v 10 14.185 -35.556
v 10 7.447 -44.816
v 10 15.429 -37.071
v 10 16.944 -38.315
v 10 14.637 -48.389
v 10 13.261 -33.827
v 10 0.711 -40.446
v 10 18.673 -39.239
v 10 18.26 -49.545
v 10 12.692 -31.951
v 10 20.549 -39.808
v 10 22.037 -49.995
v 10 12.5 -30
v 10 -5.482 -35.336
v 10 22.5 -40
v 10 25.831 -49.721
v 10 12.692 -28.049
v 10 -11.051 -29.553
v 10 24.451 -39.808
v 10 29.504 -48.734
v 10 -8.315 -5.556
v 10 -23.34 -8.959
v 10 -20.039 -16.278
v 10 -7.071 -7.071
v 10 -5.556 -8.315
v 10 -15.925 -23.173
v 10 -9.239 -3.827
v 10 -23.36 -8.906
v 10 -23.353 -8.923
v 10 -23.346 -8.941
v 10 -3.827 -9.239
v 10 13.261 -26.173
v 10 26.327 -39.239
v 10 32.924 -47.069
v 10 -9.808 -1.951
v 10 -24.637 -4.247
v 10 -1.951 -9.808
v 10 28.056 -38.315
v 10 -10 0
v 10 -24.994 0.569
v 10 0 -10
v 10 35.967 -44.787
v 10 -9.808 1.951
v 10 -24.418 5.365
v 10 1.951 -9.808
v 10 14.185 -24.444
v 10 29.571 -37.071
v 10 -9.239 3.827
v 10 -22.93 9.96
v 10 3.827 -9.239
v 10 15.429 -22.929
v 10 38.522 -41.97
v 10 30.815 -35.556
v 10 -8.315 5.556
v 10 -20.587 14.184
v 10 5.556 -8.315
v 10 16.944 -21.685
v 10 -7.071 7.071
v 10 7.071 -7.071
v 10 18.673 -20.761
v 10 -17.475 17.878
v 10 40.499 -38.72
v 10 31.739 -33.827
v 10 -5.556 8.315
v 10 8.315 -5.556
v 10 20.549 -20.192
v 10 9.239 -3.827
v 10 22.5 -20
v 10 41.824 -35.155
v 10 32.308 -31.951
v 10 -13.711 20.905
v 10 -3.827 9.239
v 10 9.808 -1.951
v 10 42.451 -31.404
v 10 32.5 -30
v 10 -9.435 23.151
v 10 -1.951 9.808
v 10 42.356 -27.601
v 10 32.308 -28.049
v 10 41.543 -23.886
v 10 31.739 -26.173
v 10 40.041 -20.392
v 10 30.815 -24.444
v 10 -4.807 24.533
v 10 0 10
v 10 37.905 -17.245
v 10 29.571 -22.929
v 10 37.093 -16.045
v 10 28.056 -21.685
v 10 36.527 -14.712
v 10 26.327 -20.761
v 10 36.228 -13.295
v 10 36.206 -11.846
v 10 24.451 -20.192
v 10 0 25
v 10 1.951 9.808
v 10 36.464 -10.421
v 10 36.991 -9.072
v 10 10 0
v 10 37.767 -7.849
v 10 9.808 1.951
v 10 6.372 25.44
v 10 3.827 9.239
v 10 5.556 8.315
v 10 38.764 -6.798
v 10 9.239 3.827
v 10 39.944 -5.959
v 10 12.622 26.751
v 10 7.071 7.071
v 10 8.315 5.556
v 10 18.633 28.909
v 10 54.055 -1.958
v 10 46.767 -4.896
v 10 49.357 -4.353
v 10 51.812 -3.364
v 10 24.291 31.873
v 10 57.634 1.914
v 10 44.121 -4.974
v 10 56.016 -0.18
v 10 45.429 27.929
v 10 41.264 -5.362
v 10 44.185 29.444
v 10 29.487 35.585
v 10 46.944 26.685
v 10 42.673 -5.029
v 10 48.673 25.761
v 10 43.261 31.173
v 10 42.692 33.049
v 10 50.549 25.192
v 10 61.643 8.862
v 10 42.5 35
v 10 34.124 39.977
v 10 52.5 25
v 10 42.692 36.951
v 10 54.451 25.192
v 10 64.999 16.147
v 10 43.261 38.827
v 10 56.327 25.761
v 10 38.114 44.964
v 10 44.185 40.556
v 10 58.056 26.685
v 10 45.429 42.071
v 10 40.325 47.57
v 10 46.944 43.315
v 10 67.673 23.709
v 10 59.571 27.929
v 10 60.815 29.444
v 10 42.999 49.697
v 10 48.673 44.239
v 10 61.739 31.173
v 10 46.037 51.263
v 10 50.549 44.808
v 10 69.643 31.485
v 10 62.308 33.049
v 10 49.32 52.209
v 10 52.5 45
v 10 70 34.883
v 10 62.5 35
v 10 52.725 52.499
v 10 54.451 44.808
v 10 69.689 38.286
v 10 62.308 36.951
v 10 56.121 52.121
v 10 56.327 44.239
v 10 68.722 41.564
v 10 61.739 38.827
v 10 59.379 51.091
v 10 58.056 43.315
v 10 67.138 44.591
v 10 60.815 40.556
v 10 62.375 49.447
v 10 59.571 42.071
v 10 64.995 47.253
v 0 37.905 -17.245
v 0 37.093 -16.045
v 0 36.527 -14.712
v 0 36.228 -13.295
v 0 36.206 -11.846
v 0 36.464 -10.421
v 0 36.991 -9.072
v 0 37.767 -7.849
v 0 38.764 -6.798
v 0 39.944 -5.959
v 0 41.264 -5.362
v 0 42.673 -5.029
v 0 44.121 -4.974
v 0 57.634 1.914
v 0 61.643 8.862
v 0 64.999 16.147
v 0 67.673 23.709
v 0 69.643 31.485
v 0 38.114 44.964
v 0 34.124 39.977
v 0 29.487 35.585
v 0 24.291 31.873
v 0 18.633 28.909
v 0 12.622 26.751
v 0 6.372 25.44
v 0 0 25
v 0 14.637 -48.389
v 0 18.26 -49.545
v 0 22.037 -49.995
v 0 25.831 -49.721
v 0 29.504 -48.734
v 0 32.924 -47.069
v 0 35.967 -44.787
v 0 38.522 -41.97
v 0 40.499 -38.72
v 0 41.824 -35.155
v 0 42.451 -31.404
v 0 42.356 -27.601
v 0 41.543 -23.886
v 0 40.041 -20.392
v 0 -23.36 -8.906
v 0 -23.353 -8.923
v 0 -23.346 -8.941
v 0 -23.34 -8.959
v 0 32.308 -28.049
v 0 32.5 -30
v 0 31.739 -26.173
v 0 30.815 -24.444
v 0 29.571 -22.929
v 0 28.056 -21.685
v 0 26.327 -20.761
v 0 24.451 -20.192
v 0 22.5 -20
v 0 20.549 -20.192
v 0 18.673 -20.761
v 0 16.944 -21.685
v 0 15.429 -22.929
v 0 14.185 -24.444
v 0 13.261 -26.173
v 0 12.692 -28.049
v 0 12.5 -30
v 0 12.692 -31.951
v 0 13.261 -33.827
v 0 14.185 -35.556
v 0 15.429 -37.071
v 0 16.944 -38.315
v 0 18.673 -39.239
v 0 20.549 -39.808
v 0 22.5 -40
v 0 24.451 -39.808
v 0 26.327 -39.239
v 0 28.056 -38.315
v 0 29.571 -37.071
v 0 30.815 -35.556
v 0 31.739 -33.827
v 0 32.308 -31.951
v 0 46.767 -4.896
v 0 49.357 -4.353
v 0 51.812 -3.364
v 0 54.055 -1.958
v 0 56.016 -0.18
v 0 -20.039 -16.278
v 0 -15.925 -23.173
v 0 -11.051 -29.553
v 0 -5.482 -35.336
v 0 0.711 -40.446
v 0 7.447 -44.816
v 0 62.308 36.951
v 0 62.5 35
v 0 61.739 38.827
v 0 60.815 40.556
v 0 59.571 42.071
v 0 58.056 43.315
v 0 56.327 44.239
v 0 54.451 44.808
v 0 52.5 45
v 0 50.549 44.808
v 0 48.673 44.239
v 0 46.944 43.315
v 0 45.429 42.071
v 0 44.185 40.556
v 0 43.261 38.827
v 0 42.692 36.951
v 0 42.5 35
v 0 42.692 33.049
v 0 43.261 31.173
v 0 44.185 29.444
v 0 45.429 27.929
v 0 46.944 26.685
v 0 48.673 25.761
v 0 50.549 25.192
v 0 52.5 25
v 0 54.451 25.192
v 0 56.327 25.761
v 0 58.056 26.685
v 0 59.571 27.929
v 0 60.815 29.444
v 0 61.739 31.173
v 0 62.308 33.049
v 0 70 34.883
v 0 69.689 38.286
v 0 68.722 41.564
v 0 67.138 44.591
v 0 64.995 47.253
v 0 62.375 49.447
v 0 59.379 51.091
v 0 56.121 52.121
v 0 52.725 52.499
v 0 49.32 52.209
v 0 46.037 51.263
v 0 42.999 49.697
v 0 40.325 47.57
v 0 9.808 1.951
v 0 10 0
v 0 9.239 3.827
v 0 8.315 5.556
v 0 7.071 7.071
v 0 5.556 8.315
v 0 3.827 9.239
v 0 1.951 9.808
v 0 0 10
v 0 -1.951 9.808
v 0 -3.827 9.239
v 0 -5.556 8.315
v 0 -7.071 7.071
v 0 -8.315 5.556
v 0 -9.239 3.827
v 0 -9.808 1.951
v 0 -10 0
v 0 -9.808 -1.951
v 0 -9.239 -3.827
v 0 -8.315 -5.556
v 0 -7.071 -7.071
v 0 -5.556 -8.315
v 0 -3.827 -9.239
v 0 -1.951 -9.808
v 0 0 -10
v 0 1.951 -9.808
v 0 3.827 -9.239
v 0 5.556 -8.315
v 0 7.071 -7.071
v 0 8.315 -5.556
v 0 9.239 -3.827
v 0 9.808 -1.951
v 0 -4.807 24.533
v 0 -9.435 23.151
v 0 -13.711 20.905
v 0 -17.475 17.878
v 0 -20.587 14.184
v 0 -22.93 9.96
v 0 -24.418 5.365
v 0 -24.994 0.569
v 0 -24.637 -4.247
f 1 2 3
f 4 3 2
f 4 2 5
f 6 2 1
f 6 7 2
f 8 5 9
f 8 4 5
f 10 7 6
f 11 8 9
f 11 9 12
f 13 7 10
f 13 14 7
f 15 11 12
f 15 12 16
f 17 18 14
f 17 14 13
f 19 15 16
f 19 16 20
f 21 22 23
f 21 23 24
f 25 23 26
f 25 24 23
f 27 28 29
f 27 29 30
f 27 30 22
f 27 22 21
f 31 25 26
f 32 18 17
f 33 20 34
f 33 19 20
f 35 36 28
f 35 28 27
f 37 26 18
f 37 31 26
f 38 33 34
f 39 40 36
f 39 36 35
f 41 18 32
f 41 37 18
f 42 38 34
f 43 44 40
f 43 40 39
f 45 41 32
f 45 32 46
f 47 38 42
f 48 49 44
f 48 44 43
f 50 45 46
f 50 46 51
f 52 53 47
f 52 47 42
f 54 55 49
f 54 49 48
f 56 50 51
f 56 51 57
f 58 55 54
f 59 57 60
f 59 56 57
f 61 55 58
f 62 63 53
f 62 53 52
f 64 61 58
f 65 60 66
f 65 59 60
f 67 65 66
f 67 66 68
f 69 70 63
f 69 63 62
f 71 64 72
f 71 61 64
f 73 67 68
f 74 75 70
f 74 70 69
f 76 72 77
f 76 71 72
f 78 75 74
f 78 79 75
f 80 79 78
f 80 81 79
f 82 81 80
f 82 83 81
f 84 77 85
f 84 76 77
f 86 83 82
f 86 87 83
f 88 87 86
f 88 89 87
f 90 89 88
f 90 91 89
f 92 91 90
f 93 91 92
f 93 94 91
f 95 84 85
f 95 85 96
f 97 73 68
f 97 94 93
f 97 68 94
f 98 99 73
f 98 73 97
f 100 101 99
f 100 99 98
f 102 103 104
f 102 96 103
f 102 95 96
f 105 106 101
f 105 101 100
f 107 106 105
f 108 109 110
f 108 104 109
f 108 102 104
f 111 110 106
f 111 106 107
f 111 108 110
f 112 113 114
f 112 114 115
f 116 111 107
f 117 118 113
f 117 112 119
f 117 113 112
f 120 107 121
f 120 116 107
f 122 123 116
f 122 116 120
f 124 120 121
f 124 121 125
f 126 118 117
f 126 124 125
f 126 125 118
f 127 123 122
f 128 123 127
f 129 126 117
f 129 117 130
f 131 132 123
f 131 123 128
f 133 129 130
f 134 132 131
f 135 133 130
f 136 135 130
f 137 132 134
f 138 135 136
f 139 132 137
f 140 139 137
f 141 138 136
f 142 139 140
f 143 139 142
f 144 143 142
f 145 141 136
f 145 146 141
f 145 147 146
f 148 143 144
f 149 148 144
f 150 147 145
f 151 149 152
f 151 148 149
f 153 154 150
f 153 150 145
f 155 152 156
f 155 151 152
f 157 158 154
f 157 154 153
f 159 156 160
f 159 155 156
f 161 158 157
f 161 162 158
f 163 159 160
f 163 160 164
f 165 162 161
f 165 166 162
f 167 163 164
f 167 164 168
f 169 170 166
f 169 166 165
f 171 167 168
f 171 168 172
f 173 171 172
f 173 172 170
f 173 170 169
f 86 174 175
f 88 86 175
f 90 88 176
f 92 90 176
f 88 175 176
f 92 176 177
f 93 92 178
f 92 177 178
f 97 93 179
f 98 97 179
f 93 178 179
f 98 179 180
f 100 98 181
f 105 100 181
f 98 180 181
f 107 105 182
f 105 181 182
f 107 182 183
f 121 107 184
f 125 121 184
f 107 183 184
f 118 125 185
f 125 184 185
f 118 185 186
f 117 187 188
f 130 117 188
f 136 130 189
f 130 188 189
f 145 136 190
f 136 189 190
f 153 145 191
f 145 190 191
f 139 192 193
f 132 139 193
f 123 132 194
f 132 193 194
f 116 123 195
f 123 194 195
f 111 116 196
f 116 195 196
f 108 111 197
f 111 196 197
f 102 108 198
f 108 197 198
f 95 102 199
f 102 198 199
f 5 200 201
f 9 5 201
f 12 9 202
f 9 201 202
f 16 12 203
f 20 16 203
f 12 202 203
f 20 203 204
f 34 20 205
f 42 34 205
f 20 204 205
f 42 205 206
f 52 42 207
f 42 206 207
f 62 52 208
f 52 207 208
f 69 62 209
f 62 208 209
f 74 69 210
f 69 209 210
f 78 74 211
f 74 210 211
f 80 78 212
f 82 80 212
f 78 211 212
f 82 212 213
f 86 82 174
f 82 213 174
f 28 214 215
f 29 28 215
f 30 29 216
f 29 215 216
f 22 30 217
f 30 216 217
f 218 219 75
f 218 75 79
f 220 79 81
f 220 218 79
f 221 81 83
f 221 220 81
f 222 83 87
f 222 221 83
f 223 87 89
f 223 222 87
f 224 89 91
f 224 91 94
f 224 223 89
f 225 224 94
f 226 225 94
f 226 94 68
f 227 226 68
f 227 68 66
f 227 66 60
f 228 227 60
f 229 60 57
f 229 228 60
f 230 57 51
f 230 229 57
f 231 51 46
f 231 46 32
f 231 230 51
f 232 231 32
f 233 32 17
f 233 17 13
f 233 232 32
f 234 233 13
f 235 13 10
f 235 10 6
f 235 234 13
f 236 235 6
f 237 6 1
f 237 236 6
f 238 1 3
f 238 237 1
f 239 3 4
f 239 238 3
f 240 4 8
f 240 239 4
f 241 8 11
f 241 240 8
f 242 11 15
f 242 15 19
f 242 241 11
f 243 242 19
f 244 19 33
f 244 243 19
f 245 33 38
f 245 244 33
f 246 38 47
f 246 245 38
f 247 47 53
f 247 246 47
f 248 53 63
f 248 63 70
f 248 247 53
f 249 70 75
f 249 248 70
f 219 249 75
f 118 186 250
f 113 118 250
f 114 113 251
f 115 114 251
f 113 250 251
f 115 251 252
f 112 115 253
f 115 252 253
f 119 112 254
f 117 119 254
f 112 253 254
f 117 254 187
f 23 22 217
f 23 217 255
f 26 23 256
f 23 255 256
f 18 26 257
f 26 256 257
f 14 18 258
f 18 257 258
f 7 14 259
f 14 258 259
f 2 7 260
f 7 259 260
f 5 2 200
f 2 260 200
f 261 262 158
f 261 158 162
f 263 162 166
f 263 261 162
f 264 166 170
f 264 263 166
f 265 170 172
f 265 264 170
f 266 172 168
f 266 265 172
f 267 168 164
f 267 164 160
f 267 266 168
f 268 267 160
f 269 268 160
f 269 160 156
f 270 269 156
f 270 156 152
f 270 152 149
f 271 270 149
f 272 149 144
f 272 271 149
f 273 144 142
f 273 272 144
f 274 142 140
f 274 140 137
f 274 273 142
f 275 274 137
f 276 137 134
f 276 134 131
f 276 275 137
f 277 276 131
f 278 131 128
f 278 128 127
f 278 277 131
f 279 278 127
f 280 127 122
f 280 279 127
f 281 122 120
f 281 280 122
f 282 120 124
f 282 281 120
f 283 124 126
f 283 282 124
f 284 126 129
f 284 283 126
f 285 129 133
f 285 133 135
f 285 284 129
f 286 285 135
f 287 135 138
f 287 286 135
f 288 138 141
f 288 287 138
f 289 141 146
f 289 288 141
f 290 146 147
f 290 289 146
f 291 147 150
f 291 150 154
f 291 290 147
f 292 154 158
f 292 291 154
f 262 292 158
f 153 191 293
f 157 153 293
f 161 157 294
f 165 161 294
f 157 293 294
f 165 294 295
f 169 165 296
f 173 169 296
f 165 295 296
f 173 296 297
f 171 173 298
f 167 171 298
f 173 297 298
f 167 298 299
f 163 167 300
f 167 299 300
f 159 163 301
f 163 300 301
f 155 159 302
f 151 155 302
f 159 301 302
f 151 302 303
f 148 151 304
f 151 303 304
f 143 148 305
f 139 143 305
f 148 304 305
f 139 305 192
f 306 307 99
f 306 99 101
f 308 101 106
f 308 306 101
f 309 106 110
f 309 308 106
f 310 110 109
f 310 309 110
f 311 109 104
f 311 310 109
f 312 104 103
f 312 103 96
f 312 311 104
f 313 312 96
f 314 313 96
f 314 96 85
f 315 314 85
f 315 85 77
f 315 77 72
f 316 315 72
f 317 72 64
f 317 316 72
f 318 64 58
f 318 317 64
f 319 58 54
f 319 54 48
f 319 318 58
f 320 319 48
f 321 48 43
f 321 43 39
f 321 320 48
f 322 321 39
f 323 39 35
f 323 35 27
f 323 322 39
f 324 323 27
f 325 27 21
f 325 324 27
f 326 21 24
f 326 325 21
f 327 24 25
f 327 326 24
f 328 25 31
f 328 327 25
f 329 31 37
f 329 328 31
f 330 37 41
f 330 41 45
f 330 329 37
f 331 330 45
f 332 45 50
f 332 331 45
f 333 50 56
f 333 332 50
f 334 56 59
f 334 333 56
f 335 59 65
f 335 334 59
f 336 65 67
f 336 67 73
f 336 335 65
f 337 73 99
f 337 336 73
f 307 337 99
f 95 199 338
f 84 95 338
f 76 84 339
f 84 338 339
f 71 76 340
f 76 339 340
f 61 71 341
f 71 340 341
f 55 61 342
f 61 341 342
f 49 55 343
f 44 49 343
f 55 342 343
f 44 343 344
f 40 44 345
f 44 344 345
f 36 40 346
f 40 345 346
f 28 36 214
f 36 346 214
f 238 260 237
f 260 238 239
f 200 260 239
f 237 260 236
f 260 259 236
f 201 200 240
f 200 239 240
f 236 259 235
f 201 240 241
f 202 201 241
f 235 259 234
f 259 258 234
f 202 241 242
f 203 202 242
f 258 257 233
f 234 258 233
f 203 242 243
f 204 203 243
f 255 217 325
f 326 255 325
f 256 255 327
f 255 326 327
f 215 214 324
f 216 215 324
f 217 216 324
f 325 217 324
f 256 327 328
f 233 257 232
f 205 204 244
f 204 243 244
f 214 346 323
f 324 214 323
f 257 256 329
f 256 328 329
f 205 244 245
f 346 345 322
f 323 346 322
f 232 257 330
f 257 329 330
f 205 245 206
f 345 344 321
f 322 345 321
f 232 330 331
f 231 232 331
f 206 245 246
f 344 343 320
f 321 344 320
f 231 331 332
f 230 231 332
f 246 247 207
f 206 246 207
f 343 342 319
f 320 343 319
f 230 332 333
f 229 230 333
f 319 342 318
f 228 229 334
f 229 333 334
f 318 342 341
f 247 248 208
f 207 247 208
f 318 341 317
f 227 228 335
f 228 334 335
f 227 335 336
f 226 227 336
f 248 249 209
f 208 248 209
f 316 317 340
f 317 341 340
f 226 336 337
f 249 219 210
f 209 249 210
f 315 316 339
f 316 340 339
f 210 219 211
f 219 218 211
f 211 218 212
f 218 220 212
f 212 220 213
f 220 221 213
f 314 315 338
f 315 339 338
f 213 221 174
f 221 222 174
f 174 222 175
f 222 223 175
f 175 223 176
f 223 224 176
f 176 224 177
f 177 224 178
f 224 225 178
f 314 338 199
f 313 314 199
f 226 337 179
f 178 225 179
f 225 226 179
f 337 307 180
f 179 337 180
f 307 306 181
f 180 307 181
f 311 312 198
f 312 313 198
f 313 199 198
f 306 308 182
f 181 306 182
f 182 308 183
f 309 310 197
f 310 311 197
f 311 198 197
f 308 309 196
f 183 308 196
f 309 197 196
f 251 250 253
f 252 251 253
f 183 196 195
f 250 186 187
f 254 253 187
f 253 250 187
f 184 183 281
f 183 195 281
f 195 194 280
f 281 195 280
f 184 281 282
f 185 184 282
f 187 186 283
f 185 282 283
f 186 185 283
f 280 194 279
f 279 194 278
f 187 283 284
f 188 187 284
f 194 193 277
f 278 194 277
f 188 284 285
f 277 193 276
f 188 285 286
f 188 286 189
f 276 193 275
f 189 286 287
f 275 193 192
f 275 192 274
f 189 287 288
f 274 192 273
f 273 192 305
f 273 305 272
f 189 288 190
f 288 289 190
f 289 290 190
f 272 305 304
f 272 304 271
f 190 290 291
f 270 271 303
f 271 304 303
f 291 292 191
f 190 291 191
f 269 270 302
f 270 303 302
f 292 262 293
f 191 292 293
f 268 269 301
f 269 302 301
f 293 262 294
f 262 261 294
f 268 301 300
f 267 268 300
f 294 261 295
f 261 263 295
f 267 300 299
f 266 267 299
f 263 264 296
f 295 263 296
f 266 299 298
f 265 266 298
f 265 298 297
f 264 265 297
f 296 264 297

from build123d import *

# Parameters (mm, degrees)
F0_R     = 10
F1_DEPTH = 10


with BuildPart() as f1:
    # F0 (on Right) → F1 (new body)
    with BuildSketch(Plane.YZ):
        with BuildLine():
            ThreePointArc((38.113879, 44.964413), (21.513052, 30.293265), (0, 25))
            ThreePointArc((0, 25), (-20.58691, 14.183763), (-23.359988, -8.905671))
            ThreePointArc((-23.359988, -8.905671), (-23.349868, -8.932169), (-23.339719, -8.958656))
            ThreePointArc((-23.339719, -8.958656), (-8.349163, -32.524314), (14.636825, -48.389412))
            ThreePointArc((14.636825, -48.389412), (38.522419, -41.970049), (37.904534, -17.244596))
            ThreePointArc((37.904534, -17.244596), (36.990811, -9.071889), (44.120823, -4.974213))
            ThreePointArc((44.120823, -4.974213), (51.812387, -3.363809), (57.634222, 1.91443))
            ThreePointArc((57.634222, 1.91443), (64.999302, 16.147055), (69.64331, 31.48476))
            ThreePointArc((69.64331, 31.48476), (59.379374, 51.091122), (38.113879, 44.964413))
        make_face()
        Circle(F0_R, mode=Mode.SUBTRACT)
        with Locations((22.5, -30)):
            Circle(F0_R, mode=Mode.SUBTRACT)
        with Locations((52.5, 35)):
            Circle(F0_R, mode=Mode.SUBTRACT)
    extrude(amount=F1_DEPTH)


solid = f1.part
